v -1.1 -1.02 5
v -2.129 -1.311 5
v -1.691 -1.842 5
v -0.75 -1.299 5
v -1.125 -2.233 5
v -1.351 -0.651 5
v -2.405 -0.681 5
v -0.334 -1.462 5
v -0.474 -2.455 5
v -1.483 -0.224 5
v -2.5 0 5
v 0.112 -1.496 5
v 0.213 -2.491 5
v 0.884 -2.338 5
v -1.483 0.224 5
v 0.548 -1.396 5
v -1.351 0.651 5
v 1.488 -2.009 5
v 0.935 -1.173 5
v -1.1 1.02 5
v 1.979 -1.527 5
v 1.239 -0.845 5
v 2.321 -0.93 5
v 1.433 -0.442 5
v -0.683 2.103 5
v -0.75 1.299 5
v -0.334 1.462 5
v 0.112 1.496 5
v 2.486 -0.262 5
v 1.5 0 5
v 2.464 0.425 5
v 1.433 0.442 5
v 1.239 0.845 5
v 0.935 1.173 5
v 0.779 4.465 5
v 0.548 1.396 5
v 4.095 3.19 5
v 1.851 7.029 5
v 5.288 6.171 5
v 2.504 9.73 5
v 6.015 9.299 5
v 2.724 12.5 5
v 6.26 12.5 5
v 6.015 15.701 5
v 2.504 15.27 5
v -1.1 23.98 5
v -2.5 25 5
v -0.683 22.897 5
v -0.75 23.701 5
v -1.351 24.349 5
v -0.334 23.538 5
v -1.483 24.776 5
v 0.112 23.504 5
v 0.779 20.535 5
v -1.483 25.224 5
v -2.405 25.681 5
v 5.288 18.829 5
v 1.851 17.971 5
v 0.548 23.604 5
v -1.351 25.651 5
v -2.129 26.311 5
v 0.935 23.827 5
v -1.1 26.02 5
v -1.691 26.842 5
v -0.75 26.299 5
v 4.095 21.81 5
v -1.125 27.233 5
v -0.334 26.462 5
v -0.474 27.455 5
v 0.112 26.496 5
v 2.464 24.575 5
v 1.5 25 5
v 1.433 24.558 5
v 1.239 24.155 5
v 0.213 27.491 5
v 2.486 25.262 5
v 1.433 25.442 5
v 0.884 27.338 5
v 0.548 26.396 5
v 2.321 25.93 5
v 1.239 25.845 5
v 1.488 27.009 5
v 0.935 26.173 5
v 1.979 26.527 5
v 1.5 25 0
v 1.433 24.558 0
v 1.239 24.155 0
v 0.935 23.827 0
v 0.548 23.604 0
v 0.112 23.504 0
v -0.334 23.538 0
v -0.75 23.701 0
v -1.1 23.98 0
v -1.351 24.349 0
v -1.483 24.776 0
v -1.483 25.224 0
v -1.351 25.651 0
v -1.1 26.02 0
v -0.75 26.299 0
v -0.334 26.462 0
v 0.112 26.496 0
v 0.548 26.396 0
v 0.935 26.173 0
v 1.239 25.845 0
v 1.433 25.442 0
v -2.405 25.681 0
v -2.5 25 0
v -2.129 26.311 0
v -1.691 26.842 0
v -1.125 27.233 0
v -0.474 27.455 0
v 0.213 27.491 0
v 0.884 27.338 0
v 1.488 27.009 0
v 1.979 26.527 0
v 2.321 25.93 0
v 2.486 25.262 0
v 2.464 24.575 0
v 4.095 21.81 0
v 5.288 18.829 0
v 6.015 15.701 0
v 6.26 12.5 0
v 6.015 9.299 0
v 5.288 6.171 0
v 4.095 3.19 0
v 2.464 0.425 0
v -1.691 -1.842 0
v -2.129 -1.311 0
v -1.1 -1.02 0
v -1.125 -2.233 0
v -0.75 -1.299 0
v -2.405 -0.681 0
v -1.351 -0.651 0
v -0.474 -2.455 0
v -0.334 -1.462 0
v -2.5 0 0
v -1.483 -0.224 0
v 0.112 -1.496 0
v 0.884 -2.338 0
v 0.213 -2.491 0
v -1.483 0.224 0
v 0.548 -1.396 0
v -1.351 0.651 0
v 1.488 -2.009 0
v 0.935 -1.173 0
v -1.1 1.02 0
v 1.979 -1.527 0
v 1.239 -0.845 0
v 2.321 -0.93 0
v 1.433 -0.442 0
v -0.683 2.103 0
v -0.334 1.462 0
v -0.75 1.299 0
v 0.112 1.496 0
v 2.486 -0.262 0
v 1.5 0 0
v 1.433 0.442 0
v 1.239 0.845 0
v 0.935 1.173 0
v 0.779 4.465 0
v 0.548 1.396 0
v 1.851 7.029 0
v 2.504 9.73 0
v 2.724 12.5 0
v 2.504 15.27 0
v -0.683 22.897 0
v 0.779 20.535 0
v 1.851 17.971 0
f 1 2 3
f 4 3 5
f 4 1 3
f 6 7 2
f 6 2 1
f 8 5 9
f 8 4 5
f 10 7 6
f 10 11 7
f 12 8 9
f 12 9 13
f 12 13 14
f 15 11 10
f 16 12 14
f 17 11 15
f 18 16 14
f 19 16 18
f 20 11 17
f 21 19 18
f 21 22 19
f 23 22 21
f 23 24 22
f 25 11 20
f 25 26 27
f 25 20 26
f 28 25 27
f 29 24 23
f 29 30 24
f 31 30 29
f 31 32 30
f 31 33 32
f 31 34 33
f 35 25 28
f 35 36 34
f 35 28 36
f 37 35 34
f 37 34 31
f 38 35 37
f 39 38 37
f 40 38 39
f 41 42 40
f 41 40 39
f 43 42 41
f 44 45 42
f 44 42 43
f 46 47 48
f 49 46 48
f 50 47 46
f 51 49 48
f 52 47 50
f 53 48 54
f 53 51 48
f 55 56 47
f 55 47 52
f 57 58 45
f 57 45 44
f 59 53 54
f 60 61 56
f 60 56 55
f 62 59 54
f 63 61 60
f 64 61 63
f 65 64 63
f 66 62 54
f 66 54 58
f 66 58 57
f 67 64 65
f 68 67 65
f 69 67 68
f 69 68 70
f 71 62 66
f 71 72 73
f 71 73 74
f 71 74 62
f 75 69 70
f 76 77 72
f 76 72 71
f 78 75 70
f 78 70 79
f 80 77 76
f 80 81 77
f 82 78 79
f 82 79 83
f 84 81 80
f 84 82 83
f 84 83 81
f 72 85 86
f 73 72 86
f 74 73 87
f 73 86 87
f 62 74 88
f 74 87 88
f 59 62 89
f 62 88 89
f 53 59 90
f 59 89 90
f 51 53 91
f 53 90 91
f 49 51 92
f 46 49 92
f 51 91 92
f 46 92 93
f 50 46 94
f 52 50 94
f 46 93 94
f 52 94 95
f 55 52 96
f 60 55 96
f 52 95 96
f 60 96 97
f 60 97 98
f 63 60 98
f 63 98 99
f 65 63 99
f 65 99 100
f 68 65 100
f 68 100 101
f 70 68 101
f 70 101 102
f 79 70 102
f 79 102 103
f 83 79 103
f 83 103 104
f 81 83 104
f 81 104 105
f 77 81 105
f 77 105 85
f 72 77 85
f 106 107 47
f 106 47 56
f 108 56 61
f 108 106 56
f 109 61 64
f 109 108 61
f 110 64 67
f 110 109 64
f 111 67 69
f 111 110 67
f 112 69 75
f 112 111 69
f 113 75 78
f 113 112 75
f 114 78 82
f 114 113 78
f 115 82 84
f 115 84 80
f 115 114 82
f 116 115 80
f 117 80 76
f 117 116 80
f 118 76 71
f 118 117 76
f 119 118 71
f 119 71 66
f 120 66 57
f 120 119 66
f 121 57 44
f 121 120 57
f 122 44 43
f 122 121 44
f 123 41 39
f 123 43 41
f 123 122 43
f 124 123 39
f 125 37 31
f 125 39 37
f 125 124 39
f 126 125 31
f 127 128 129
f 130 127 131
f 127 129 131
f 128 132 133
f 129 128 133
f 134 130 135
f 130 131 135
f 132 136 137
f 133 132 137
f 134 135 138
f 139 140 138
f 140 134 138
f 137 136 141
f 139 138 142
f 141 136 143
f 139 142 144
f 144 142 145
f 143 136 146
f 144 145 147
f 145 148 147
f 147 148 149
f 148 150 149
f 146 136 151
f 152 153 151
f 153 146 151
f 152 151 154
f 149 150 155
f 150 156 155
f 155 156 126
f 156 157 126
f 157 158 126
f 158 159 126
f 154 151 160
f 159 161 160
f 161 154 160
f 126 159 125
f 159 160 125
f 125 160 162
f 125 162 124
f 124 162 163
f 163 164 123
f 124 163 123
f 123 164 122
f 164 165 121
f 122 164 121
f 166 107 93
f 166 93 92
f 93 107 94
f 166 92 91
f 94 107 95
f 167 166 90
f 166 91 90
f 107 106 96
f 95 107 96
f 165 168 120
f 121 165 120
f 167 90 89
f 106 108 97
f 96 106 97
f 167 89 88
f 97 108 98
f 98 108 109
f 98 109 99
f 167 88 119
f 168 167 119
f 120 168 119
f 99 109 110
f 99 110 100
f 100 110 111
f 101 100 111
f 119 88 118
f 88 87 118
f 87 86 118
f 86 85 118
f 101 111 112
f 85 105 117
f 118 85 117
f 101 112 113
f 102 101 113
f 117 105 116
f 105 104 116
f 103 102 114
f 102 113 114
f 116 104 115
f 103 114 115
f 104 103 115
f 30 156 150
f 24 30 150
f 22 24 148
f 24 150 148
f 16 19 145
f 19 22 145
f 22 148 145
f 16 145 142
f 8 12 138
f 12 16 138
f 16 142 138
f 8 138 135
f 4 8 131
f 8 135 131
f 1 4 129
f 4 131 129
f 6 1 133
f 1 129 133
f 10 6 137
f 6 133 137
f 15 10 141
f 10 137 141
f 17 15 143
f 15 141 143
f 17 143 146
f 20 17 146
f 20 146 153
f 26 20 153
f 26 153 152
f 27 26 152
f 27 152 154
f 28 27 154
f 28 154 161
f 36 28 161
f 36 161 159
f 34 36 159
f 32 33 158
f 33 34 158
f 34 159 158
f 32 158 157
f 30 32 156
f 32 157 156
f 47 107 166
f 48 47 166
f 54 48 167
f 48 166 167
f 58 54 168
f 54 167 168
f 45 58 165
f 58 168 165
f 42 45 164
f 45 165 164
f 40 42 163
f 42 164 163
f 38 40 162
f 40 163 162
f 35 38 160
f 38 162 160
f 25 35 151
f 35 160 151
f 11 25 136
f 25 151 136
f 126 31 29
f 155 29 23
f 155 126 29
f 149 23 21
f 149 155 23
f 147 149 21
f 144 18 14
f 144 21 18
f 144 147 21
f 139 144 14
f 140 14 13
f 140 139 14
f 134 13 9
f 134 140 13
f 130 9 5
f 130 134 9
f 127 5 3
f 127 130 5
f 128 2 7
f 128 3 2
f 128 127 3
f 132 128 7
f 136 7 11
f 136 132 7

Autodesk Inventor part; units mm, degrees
ref_plane "YZ Plane" through (0, 0, 0) normal (1, 0, 0) x (0, 1, 0)
ref_plane "XZ Plane" through (0, 0, 0) normal (0, 1, 0) x (-1, 0, 0)
ref_plane "XY Plane" through (0, 0, 0) normal (0, 0, 1) x (1, 0, 0)
sketch "Sketch1" plane through (0, 0, 0) normal (0, 0, 1) x (1, 0, 0)
  circle A0 centre (0, 0) radius 1.5
  circle A1 centre (0, 25) radius 1.5
  arc A2 (2.4636, 24.5748) -> (0, 22.5) centre (0, 25) ccw
  arc A3 (-2.5, 0) -> (-0.4252, 2.4636) centre (0, 0) ccw
  line L0 (0, 16.5) -> (0, 25)
  arc A4 (0, -2.5) -> (0, 27.5) centre (-14.8423, 12.5) ccw
  arc A5 (-2.5, 0) -> (-2.5, 25) centre (-14.8423, 12.5) ccw
  dimension "d0" = 3
  dimension "d3" = 25
  dimension "d4" = 3
  dimension "d5" = 5
  dimension "d6" = 5
extrude "Extrusion1" add sketch "Sketch1" along normal blind 5 contours A4 A2 | A4 A3 A5 L0 A2 | A4 A3 A5 | A3 A4 | A2 L0 A5
properties part number "bar_mid"
